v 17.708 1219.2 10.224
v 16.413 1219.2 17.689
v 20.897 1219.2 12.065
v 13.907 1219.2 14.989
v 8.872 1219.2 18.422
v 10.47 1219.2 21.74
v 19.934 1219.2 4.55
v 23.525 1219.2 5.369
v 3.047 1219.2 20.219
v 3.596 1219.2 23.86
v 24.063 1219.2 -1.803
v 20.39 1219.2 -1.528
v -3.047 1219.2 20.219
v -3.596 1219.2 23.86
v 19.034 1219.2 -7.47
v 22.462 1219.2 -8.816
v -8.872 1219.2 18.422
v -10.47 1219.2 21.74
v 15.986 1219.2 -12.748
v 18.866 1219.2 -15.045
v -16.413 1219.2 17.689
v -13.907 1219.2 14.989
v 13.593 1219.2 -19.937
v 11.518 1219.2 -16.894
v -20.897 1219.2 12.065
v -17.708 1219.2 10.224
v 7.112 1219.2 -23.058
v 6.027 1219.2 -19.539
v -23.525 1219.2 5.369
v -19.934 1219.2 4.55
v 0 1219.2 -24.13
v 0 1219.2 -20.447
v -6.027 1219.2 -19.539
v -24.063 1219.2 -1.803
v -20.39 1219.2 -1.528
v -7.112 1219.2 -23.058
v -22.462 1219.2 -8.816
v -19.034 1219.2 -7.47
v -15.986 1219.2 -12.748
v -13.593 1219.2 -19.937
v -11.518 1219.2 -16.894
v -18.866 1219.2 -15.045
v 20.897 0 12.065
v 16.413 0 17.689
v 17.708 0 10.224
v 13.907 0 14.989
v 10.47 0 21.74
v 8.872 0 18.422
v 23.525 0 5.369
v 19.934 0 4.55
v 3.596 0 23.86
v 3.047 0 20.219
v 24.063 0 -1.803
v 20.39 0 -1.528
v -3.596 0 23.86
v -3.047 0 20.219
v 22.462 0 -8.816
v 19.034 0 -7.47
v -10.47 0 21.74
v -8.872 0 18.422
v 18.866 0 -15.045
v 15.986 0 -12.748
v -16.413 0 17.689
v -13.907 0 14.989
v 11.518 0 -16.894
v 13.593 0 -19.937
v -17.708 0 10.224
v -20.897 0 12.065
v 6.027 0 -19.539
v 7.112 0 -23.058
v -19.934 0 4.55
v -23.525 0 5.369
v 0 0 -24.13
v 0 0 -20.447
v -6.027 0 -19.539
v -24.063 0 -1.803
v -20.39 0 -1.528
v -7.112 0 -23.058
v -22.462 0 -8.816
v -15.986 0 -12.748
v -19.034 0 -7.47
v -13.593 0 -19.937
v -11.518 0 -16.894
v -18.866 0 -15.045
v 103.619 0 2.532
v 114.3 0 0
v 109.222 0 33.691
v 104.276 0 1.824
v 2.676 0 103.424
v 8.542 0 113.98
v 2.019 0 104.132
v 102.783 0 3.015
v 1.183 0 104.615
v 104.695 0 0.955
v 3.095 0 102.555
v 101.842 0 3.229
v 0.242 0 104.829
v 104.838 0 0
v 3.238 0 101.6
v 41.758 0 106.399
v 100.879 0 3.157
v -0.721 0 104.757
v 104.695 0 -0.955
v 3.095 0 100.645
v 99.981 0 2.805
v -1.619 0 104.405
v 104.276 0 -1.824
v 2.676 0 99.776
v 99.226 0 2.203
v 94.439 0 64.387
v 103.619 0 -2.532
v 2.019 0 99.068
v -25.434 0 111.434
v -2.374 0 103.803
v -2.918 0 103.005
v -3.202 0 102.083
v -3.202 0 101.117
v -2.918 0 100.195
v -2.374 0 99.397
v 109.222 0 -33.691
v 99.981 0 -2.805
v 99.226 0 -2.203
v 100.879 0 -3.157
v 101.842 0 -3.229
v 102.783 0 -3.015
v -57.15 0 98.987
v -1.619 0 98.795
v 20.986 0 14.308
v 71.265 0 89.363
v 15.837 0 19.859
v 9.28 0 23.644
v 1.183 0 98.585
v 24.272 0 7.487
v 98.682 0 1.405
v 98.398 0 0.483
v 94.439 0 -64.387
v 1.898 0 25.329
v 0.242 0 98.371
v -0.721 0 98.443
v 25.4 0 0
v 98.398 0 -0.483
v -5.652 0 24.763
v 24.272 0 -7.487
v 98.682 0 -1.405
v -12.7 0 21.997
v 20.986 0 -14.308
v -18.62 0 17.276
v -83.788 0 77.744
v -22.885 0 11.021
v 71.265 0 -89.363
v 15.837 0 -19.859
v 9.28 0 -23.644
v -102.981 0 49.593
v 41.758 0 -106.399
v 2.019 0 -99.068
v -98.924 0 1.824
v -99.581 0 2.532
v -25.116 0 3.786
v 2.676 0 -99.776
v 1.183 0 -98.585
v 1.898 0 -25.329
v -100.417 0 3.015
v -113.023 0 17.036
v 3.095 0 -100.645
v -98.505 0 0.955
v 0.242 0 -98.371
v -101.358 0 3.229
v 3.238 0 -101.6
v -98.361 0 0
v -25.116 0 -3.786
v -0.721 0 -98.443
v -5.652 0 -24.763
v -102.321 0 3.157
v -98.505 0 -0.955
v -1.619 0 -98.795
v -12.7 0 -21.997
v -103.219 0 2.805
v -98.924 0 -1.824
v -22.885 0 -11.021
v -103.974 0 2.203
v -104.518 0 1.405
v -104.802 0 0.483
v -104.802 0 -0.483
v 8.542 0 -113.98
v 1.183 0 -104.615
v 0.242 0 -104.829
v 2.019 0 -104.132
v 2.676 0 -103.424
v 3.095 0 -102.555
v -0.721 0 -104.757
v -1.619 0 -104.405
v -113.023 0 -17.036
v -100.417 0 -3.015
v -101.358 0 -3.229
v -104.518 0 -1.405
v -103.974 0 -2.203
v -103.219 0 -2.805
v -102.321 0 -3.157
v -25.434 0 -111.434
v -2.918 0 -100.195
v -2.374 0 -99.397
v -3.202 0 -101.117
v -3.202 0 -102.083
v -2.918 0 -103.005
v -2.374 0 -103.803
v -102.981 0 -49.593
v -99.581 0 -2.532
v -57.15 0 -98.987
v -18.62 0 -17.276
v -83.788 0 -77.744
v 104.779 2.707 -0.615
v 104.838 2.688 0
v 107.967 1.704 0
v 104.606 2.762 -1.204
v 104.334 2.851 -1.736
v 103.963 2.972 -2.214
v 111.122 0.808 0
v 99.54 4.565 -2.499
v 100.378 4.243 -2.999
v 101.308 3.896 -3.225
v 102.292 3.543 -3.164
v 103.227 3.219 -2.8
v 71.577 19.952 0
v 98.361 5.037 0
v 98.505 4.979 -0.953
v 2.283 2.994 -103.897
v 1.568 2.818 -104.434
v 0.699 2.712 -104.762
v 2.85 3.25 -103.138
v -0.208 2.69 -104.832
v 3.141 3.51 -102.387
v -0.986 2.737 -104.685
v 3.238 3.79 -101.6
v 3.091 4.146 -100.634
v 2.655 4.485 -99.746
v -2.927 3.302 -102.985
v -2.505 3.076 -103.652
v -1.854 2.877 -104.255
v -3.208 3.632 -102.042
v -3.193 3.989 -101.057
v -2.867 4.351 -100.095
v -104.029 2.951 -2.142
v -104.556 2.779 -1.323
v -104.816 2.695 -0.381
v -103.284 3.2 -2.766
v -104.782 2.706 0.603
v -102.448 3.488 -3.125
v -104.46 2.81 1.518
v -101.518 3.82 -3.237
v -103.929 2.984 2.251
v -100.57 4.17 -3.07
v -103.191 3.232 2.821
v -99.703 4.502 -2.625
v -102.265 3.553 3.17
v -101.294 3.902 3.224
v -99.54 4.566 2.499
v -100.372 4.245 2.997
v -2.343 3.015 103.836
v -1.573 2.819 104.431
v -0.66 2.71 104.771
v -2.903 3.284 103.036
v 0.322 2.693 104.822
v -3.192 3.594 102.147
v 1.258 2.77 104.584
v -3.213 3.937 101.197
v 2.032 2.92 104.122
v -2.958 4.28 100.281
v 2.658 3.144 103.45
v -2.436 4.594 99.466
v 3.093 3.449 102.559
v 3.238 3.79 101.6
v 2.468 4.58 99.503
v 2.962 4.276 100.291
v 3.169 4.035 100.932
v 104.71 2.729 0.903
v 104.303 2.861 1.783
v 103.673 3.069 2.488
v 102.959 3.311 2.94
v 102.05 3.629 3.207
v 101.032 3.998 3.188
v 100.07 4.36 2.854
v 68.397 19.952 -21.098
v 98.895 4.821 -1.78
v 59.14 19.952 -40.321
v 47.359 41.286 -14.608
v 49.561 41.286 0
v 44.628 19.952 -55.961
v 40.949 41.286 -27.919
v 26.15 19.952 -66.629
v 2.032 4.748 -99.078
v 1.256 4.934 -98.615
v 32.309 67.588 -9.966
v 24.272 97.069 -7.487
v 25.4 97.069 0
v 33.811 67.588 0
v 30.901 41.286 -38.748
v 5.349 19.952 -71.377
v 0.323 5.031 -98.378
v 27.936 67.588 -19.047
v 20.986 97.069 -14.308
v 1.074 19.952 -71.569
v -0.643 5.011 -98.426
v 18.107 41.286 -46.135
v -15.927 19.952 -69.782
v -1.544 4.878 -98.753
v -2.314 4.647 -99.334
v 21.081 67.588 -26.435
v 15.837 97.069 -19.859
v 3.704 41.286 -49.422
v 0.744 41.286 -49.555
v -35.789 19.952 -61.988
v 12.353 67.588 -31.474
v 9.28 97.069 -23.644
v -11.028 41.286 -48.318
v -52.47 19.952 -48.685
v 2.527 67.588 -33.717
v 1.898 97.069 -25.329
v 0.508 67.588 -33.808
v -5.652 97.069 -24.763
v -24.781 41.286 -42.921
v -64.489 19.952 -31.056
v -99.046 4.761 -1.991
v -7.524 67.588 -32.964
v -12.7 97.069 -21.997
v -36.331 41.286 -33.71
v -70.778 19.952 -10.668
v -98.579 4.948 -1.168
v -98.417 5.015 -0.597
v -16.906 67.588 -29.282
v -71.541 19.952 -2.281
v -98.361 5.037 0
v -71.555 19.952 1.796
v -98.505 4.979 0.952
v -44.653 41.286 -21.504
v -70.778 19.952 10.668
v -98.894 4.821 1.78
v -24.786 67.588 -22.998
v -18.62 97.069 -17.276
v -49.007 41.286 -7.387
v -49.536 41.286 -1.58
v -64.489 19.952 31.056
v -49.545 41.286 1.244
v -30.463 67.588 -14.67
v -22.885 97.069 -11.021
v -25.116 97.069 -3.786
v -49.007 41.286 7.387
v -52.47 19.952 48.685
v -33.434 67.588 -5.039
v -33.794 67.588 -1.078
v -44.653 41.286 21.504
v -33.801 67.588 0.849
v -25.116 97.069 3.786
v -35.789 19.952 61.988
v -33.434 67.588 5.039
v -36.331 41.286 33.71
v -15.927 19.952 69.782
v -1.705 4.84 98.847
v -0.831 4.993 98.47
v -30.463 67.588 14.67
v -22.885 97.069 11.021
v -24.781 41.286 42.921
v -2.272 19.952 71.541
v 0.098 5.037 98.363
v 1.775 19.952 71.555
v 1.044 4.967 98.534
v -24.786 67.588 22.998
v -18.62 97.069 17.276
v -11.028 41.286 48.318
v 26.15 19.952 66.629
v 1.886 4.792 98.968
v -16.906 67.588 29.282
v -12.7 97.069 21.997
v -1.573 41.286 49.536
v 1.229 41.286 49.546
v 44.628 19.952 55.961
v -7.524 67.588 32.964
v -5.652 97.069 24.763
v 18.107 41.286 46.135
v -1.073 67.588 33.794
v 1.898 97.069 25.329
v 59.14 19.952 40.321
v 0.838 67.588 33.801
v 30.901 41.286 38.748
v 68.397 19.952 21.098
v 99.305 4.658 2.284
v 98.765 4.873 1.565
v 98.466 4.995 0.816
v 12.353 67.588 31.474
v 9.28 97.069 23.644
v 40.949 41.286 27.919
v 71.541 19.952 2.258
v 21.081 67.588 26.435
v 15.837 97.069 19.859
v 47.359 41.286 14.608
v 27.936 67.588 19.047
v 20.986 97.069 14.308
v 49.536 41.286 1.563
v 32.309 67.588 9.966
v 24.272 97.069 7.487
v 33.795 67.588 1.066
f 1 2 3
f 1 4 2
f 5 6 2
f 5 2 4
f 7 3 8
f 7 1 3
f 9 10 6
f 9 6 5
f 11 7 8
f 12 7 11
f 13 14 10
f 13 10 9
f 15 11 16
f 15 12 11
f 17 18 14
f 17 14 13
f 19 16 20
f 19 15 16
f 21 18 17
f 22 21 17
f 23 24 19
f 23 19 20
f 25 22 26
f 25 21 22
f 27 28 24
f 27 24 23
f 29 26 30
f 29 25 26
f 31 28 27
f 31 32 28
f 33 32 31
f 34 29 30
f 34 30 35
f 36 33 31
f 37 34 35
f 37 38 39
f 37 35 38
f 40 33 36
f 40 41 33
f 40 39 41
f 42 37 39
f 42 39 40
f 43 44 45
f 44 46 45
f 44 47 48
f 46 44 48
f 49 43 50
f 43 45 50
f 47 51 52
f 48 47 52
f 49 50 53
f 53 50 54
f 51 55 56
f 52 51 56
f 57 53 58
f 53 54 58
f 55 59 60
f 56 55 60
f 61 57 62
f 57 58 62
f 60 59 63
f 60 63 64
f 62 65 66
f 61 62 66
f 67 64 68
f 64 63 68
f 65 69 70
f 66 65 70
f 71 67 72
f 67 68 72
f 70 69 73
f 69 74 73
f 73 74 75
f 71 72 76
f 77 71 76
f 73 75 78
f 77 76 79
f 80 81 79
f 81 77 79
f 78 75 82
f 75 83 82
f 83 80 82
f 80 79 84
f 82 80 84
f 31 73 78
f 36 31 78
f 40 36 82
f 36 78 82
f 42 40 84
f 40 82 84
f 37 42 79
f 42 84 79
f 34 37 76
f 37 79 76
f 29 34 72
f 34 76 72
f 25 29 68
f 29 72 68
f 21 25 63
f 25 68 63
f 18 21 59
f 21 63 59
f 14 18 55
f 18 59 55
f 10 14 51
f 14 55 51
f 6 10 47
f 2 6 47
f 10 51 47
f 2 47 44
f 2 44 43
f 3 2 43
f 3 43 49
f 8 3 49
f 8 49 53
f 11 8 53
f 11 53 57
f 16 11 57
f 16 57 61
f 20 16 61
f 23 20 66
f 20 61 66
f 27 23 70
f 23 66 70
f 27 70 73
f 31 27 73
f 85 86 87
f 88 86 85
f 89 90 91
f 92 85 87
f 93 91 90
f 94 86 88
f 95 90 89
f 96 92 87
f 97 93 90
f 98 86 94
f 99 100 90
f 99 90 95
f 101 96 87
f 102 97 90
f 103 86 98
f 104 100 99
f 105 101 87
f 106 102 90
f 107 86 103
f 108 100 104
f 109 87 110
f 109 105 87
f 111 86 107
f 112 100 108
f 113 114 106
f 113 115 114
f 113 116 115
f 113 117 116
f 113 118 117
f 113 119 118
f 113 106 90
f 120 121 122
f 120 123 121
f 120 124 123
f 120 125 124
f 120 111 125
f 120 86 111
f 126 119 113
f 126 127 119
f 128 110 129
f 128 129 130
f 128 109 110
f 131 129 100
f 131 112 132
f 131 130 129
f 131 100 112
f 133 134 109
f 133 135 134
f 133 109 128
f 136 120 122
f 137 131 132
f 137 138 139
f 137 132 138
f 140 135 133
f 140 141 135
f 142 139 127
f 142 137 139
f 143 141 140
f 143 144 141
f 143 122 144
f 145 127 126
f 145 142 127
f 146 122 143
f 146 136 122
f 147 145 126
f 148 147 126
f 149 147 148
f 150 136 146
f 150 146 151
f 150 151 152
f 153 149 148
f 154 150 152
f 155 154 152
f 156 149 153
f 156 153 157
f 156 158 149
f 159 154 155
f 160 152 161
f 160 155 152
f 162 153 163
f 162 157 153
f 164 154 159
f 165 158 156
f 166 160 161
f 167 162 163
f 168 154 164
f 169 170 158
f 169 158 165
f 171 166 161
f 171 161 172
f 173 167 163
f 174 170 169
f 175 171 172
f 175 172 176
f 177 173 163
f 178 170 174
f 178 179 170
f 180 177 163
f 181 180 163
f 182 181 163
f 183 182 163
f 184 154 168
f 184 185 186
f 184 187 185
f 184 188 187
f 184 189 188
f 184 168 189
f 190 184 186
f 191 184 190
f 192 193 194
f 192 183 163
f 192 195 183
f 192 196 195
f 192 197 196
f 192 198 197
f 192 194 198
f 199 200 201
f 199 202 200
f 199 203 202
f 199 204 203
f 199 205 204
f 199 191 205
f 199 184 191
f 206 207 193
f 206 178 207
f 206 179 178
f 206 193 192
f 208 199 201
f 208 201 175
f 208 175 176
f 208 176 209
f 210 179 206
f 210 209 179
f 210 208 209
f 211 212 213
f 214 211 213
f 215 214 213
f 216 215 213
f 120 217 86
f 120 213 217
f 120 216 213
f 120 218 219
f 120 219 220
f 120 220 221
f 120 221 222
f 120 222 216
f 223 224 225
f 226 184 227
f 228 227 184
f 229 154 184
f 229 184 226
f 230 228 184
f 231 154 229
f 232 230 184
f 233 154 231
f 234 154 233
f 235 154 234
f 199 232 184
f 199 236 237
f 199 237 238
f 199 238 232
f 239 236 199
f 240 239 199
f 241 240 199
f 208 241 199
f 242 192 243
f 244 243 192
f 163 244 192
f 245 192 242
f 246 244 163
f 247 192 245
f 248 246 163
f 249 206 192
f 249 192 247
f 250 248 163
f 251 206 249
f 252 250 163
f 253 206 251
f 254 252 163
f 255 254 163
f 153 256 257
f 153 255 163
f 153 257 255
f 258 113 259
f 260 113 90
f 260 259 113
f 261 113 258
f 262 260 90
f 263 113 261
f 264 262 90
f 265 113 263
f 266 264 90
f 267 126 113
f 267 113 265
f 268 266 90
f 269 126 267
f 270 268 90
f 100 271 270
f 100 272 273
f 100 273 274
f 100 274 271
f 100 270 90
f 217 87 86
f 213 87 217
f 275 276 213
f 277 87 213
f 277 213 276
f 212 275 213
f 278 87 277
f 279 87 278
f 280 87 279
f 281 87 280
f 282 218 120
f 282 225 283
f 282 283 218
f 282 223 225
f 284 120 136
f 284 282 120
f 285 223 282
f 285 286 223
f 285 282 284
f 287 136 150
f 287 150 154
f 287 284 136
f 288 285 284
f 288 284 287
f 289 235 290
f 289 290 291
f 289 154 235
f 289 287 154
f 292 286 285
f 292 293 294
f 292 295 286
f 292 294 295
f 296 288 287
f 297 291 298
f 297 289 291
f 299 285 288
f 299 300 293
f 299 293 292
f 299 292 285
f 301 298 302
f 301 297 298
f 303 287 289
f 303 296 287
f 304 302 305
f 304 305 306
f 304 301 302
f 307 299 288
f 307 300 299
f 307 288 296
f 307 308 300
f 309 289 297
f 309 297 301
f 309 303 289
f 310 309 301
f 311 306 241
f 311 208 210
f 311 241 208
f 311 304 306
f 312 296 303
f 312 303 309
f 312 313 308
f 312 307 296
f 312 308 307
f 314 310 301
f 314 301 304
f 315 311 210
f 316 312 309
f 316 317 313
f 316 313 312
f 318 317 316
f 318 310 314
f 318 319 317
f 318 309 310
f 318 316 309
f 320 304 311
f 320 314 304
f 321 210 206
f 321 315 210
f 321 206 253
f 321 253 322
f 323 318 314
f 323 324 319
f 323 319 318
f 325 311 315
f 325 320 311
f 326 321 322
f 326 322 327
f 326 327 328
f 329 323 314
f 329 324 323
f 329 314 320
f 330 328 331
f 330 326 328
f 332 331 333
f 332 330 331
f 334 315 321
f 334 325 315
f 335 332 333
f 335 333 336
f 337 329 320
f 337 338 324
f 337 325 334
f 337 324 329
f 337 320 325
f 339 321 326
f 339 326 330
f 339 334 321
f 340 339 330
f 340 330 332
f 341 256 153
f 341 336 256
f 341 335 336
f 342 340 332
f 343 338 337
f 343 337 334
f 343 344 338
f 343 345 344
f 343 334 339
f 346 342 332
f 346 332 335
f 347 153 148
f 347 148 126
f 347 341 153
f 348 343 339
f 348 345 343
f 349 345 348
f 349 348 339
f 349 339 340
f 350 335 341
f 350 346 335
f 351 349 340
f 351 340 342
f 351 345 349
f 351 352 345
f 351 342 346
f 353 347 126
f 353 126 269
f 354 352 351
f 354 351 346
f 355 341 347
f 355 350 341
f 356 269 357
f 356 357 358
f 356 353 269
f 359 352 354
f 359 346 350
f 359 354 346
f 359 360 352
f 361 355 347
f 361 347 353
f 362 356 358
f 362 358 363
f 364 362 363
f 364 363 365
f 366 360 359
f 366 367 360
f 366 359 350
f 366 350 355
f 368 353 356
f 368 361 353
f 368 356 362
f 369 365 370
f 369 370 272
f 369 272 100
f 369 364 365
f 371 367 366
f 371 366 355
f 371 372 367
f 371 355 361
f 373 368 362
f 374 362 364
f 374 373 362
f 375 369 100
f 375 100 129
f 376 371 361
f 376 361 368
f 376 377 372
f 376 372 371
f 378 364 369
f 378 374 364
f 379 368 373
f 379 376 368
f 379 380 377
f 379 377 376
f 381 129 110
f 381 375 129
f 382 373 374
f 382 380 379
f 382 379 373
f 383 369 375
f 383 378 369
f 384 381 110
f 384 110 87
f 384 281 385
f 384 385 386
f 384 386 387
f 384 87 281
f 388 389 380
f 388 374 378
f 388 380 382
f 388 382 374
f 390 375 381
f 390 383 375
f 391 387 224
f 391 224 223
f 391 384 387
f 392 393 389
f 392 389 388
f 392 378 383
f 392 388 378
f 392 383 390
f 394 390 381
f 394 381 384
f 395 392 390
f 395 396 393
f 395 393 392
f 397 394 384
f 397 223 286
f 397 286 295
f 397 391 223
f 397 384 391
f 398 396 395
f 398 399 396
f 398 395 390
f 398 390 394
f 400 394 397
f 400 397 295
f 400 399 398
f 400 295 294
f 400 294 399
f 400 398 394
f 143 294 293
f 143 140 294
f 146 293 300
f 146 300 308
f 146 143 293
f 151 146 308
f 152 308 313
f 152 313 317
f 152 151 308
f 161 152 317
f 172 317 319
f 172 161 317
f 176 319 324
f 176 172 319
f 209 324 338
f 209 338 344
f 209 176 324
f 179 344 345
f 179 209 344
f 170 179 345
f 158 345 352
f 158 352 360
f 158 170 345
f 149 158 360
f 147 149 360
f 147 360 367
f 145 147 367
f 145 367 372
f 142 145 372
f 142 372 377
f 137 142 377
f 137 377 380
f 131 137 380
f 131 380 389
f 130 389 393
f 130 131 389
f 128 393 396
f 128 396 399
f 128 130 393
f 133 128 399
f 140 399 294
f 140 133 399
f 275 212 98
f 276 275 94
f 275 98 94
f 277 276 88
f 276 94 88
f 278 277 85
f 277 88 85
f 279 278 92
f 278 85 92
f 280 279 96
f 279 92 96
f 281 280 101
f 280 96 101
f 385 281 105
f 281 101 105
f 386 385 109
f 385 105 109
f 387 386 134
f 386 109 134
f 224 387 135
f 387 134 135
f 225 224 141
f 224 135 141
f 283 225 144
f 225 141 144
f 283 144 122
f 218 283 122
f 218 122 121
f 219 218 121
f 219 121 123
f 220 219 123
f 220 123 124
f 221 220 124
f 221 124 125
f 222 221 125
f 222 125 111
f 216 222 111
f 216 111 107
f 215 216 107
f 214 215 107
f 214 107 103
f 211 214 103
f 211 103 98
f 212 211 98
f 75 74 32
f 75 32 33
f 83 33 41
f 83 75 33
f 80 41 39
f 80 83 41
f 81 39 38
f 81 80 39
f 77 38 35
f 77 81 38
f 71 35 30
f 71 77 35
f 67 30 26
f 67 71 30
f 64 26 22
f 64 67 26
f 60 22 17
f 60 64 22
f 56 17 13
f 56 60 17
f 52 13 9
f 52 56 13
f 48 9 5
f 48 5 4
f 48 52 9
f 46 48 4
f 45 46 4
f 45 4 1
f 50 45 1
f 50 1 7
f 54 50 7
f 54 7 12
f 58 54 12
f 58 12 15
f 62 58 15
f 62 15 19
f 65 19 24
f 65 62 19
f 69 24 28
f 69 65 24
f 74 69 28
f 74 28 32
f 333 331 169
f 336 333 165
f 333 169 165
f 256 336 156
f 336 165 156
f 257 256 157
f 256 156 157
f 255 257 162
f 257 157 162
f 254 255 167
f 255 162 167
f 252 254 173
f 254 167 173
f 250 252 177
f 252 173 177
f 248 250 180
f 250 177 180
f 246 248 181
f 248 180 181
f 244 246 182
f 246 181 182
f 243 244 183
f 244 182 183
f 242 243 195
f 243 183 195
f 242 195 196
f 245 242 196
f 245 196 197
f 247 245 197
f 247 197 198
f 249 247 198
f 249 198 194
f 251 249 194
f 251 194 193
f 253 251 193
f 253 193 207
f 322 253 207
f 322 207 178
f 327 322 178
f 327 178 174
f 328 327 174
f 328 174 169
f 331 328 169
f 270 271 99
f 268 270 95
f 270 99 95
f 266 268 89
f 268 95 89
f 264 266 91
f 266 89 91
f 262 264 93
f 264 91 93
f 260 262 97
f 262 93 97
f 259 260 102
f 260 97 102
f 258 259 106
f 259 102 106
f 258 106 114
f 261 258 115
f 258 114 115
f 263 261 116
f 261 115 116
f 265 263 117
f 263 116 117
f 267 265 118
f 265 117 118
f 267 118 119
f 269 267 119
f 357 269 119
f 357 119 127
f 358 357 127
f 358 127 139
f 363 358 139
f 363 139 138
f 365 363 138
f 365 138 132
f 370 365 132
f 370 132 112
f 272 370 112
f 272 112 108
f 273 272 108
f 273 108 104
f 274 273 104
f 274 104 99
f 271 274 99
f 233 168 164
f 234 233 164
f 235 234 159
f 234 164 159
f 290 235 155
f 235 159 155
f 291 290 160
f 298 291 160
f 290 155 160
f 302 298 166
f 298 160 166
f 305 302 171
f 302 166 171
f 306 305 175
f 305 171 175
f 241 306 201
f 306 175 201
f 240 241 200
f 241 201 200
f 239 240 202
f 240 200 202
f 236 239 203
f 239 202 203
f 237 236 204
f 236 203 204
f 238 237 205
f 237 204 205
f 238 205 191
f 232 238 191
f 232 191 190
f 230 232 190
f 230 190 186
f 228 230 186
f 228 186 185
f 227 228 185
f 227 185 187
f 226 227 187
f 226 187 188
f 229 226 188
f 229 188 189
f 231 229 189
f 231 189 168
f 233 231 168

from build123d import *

# Parameters (mm, degrees)
SKETCH1_R           = 24.13
SKETCH1_R_2         = 20.447
BOSS_EXTRUDE1_DEPTH = 1219.2
SKETCH3_R           = 3.2385
CUT_EXTRUDE1_DEPTH  = 1219.2


with BuildPart() as part:
    # Sketch1 → Boss-Extrude1 (new body)
    with BuildSketch(Plane(origin=(0, 0, 0), x_dir=(1, 0, 0), z_dir=(0, 1, 0))):
        with Locations(Location((0, 0, 0), (0, 0, 90))):
            Circle(SKETCH1_R)
        with Locations(Location((0, 0, 0), (0, 0, 90))):
            Circle(SKETCH1_R_2, mode=Mode.SUBTRACT)
    extrude(amount=BOSS_EXTRUDE1_DEPTH)


with BuildPart() as body_2:
    # Sketch2 → Revolve2 (revolve)
    with BuildSketch(Plane.XY):
        with BuildLine():
            Line((25.4, 97.068926284), (25.4, 0))
            Line((25.4, 0), (114.3, 0))
            ThreePointArc((114.3, 0), (54.98641701, 34.921738881), (25.4, 97.068926284))
        make_face()
    revolve(axis=Axis((0, 0, 0), (0, 1, 0)))

    # Sketch3 → Cut-Extrude1 (cut)
    with BuildSketch(Plane.XZ):
        with Locations((0, 101.6)):
            Circle(SKETCH3_R)
        with Locations((101.6, 0)):
            Circle(SKETCH3_R)
        with Locations((0, -101.6)):
            Circle(SKETCH3_R)
        with Locations((-101.6, 0)):
            Circle(SKETCH3_R)
    extrude(amount=-CUT_EXTRUDE1_DEPTH, mode=Mode.SUBTRACT)


solid = Compound([part.part, body_2.part])
